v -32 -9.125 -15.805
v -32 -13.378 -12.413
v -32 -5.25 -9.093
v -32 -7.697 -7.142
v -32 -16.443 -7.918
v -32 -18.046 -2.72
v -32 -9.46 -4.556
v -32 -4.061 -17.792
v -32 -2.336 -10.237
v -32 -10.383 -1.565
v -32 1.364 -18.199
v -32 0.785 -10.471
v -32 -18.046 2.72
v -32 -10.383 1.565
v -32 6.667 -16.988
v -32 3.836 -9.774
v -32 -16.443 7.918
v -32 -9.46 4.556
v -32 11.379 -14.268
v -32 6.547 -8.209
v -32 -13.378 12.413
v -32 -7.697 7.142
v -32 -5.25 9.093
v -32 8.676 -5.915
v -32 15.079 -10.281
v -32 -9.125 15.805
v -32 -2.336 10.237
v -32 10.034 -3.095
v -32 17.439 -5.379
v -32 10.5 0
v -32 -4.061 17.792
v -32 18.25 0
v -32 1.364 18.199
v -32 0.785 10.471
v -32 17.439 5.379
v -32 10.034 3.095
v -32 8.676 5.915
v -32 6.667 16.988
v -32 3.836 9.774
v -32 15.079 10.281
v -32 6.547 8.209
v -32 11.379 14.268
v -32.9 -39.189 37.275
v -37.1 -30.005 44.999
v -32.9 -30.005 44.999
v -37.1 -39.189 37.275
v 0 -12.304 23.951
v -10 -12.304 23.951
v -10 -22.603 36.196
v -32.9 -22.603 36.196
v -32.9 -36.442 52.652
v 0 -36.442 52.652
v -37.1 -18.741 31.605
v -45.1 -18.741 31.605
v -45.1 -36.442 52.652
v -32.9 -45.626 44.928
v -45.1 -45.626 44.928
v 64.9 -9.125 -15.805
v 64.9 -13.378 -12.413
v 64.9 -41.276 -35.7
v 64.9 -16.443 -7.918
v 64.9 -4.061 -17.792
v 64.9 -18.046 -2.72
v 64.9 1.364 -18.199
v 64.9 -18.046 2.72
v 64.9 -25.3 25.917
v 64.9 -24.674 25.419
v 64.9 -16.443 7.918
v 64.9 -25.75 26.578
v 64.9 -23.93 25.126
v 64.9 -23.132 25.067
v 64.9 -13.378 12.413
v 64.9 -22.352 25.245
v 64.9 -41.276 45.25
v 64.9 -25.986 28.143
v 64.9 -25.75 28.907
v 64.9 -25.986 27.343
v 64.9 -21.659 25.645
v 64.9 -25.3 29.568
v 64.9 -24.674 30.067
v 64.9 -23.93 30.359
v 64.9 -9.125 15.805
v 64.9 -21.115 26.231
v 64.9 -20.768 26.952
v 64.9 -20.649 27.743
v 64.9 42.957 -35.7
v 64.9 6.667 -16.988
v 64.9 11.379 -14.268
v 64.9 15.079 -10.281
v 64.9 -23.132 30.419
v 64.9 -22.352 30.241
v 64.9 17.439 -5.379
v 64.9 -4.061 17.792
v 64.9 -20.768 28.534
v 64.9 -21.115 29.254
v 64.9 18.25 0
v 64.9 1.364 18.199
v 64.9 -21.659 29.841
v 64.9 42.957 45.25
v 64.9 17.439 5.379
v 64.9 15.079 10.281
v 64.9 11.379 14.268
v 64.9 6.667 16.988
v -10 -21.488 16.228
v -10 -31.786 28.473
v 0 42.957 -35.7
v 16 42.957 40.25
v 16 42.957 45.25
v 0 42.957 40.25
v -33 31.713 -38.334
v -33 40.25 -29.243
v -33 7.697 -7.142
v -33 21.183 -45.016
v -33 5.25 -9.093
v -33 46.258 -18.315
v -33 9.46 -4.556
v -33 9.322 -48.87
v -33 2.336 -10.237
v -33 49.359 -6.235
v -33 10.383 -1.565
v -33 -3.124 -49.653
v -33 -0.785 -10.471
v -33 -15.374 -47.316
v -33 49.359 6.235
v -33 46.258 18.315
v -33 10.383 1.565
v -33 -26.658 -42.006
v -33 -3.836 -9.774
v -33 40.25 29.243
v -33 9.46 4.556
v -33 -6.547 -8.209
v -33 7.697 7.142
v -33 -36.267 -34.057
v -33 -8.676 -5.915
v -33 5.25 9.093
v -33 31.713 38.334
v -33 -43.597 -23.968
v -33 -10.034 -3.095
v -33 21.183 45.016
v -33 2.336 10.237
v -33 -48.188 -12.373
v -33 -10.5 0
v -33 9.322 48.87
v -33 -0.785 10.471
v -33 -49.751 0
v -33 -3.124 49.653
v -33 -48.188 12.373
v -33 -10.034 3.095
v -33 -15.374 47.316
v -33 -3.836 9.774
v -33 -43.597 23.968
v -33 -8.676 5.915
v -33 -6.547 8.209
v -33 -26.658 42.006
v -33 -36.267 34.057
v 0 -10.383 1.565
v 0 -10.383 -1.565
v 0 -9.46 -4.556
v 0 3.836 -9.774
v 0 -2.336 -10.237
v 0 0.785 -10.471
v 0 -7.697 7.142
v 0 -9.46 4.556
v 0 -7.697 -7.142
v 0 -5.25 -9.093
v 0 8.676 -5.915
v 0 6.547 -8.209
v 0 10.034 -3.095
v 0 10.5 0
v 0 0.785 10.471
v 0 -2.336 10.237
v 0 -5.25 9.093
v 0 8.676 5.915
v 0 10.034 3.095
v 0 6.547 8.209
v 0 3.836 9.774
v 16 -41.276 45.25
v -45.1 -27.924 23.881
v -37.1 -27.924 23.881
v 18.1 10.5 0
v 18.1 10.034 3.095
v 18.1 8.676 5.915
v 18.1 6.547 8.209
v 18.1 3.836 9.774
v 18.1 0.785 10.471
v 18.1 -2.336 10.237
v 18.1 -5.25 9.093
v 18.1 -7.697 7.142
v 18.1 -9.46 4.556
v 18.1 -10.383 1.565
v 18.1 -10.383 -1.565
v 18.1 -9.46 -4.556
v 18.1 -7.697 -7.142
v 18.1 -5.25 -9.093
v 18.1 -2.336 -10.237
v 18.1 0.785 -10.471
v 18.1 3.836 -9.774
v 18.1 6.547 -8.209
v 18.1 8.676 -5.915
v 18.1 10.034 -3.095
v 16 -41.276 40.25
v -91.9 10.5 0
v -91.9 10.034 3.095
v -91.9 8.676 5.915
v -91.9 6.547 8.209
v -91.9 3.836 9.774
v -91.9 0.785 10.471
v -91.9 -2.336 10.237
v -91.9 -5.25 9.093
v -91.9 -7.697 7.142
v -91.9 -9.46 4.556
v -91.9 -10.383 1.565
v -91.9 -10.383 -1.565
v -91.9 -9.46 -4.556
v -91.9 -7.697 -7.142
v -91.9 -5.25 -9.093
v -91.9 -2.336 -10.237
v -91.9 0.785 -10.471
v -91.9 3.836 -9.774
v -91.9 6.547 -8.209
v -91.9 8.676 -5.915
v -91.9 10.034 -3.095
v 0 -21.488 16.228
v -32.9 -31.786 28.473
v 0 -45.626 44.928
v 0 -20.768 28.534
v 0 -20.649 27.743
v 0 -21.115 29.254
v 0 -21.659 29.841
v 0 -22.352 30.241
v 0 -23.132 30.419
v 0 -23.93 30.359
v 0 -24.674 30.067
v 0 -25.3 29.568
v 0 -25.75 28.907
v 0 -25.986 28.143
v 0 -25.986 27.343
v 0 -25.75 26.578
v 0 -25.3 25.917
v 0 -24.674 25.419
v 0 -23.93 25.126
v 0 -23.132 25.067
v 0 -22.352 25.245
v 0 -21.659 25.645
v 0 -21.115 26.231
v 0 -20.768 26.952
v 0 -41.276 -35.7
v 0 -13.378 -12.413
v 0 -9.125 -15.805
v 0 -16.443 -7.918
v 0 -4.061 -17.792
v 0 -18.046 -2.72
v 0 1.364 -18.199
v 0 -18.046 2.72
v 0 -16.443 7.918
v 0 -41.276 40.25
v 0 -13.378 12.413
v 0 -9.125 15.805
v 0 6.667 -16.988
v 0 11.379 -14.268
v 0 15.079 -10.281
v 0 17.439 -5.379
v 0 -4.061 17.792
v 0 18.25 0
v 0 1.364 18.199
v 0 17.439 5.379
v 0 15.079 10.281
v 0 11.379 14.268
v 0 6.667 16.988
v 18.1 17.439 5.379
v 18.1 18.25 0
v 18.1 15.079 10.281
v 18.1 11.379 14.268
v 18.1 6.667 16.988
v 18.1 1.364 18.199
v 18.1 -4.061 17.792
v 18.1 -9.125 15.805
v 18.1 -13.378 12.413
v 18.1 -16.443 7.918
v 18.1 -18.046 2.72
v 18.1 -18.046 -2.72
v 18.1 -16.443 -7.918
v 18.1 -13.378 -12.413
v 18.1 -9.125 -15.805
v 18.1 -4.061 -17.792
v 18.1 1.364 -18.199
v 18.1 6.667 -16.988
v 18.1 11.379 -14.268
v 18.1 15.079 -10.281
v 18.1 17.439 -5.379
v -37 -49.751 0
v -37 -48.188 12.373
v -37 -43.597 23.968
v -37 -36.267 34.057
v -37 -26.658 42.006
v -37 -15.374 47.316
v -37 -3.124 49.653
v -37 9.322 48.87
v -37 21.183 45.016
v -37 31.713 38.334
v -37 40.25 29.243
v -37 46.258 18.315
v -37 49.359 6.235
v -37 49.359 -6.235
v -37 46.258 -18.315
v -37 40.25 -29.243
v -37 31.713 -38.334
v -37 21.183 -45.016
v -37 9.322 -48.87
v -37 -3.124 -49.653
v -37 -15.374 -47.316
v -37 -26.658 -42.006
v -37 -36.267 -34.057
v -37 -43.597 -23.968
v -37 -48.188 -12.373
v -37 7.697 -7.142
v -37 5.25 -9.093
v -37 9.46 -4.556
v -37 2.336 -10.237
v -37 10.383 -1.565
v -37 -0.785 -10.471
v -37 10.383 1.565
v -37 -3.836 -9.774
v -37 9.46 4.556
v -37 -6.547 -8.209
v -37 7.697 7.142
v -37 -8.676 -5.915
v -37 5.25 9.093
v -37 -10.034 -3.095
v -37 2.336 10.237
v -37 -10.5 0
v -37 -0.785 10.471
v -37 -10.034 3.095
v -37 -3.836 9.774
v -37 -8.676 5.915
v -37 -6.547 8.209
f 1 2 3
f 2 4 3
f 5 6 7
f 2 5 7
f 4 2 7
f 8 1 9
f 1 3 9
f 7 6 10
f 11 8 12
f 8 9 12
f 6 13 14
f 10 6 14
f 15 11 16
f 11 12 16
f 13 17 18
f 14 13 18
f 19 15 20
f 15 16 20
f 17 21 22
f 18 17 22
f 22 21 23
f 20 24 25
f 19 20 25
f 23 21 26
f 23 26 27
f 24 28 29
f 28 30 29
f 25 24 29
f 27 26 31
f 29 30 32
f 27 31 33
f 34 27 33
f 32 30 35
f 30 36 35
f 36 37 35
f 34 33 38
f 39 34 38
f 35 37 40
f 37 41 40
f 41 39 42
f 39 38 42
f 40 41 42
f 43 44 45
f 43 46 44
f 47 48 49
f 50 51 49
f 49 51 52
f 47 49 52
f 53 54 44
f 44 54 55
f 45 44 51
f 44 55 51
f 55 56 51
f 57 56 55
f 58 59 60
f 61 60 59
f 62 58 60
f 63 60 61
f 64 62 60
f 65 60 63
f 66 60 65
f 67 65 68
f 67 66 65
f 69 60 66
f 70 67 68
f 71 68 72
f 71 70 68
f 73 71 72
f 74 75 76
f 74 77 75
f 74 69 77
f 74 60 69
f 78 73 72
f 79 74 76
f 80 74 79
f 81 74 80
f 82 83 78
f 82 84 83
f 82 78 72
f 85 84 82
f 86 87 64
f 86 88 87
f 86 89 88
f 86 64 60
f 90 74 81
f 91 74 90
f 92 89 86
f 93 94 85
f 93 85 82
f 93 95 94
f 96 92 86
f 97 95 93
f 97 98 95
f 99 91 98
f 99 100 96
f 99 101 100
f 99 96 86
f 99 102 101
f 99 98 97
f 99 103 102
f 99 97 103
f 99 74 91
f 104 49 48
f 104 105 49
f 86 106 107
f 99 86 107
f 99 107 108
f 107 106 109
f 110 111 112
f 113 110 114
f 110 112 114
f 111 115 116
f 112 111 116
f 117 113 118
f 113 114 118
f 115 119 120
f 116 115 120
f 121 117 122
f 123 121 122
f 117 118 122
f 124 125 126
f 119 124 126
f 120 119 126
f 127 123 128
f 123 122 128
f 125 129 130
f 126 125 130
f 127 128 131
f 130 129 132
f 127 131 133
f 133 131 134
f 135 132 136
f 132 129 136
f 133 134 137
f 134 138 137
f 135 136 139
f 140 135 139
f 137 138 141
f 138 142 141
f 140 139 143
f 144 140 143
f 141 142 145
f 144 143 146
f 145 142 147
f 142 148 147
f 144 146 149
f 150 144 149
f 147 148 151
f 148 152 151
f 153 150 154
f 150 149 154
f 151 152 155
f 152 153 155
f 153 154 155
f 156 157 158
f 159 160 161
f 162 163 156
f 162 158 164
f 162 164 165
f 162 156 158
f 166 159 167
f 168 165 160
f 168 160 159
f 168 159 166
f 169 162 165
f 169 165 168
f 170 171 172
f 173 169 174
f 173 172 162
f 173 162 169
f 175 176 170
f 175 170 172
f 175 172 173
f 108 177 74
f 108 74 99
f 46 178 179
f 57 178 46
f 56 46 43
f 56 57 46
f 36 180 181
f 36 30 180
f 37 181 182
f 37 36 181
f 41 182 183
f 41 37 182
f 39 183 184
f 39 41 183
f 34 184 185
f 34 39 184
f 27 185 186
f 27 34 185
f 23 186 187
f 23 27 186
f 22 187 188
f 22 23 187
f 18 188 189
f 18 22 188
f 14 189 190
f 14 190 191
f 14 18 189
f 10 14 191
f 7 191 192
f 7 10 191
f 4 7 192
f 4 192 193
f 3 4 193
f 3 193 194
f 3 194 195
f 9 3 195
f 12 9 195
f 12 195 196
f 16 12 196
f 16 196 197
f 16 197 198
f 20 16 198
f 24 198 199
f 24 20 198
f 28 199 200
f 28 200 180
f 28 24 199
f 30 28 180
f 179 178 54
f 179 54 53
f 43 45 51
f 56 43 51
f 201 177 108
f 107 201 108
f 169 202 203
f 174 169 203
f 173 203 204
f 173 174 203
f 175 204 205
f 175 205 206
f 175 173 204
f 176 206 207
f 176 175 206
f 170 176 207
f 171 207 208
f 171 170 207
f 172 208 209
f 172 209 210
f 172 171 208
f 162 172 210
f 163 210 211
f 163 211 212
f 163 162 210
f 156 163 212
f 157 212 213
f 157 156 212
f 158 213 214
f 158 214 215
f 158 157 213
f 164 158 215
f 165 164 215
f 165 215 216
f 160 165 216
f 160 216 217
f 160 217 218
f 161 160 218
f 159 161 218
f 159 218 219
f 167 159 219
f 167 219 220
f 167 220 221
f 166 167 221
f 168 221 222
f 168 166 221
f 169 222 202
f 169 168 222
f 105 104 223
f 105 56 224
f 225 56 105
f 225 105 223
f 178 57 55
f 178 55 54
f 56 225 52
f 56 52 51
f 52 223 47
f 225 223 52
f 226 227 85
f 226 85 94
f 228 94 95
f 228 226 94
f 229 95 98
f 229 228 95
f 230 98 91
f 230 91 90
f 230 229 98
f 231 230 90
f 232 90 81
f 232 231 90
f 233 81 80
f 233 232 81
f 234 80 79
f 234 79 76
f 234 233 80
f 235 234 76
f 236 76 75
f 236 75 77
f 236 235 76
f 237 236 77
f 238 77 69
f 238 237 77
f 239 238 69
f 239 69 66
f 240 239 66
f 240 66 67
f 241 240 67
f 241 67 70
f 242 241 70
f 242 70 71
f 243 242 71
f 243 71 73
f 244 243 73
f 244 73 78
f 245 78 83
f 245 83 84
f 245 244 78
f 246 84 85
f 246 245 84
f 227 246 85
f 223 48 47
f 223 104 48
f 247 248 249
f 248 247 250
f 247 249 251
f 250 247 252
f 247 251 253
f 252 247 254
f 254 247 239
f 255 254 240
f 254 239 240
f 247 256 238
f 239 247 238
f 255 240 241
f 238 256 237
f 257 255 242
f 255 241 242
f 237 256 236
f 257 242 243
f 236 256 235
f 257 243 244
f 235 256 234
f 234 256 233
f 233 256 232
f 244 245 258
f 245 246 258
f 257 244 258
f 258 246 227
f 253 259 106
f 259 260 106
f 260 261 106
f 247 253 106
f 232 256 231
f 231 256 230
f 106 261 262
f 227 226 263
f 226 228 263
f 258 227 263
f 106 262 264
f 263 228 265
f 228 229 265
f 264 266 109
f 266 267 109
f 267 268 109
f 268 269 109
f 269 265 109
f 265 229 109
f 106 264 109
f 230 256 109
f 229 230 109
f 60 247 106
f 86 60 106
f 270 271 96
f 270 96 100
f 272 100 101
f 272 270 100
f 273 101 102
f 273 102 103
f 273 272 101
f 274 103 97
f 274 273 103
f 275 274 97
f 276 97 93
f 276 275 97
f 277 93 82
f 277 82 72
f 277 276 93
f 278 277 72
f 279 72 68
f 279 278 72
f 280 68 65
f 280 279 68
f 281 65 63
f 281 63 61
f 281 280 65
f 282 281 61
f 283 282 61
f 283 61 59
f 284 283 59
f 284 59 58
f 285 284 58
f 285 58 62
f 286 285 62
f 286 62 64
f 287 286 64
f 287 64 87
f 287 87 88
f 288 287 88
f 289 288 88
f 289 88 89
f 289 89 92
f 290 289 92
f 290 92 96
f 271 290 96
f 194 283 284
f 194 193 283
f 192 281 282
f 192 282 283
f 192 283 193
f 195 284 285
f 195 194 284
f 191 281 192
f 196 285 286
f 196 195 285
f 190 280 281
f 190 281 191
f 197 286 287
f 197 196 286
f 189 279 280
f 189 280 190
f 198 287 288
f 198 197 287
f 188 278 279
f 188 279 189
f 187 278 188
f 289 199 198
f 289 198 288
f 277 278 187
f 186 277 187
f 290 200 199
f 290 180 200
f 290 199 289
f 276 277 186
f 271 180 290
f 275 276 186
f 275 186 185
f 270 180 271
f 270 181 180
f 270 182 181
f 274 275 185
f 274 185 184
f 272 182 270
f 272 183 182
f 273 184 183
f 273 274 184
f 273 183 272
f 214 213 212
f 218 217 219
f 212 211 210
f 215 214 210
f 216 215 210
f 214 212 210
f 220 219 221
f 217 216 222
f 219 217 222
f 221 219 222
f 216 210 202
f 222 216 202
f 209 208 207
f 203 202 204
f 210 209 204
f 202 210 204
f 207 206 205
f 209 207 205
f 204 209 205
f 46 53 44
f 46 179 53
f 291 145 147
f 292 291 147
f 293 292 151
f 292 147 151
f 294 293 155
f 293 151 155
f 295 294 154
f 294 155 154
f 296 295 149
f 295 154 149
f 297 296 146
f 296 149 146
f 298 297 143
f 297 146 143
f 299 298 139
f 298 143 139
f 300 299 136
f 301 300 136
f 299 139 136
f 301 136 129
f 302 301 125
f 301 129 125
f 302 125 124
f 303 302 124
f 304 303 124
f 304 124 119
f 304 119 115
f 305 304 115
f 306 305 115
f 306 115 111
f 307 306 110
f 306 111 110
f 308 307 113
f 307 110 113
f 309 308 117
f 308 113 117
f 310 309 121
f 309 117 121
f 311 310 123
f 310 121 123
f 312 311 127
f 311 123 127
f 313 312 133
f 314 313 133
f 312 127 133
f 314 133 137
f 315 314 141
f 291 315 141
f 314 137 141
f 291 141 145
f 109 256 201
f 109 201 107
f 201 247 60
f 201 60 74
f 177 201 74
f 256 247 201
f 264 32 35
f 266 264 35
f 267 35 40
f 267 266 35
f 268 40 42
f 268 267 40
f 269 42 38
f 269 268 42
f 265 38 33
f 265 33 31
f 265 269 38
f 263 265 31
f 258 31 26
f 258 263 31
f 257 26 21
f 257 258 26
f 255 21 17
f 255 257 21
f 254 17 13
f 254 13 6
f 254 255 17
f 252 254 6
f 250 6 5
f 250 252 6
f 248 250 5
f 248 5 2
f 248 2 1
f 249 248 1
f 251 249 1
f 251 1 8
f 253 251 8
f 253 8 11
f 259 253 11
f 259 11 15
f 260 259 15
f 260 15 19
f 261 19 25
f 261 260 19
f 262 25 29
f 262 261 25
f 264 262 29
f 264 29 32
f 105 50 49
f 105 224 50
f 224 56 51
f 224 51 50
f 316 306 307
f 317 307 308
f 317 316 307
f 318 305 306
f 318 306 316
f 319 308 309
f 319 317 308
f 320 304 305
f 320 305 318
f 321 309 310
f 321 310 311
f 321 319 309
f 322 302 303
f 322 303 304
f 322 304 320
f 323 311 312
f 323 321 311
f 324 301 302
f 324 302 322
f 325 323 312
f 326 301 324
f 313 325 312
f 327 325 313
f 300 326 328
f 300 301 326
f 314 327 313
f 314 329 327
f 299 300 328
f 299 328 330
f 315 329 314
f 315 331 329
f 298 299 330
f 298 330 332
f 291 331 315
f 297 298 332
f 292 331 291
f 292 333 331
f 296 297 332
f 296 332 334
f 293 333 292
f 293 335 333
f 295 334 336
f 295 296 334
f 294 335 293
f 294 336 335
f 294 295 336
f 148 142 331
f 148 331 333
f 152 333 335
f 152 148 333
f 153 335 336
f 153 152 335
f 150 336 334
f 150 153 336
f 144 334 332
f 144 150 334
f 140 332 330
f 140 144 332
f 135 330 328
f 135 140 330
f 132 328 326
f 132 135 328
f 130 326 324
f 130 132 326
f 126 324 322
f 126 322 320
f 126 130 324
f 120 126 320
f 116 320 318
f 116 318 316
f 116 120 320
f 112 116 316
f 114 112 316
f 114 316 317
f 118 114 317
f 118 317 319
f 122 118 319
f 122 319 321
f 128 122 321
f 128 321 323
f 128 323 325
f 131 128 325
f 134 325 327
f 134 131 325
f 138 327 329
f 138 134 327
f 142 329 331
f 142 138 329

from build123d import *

# Parameters (mm, degrees)
F0_W          = 84.2324148785
F0_H          = 75.9502873162
F0_R          = 18.25
F0_R_2        = 2.6835567487
F1_DEPTH      = 64.9
F2_START      = 16
F0_H_2        = 5
F2_DEPTH      = 48.9
F0_R_3        = 10.5
F3_DEPTH      = 32
F3_DEPTH_BACK = 18.1
F4_DEPTH      = 91.9
F6_R          = 49.7512294039
F6_R_2        = 10.5
F7_DEPTH      = 4
F10_DEPTH     = 6
F11_DEPTH     = 6


with BuildPart() as f1:
    # F0 (on Right) → F1 (new body)
    with BuildSketch(Plane.YZ):
        with Locations((0.8405496071, 2.2748563419)):
            Rectangle(F0_W, F0_H)
        Circle(F0_R, mode=Mode.SUBTRACT)
        with Locations((-23.3325695414, 27.7426332311)):
            Circle(F0_R_2, mode=Mode.SUBTRACT)
    extrude(amount=F1_DEPTH)

    # F0 (on Right) → F2 (join)
    with BuildSketch(Plane.YZ.offset(F2_START)):
        with Locations((0.8405496071, 42.75)):
            Rectangle(F0_W, F0_H_2)
    extrude(amount=F2_DEPTH)

    # F0 (on Right) → F3 (join, two sides)
    with BuildSketch(Plane.YZ) as f3_sk:
        Circle(F0_R)
        Circle(F0_R_3, mode=Mode.SUBTRACT)
    extrude(amount=-F3_DEPTH)
    extrude(f3_sk.sketch, amount=F3_DEPTH_BACK)


with BuildPart() as f4:
    # F0 (on Right) → F4 (new body)
    with BuildSketch(Plane.YZ):
        Circle(F0_R_3)
    extrude(amount=-F4_DEPTH)


with BuildPart() as f7:
    # F6 (on offset) → F7 (new body)
    with BuildSketch(Plane(origin=(-33, 0, 0), x_dir=(0, -1, 0), z_dir=(-1, 0, 0))):
        Circle(F6_R)
        Circle(F6_R_2, mode=Mode.SUBTRACT)
    extrude(amount=F7_DEPTH)


with BuildPart() as f10:
    # F9 (on 3pt) → F10 (new body, symmetric)
    with BuildSketch(Plane(origin=(0, 0, 0), x_dir=(1, 0, 0), z_dir=(0, -0.7653140202, -0.6436570908))):
        Polygon((-10, 26.25), (0, 26.25), (0, 63.7512294039), (-32.9, 63.7512294039), (-32.9, 53.7512294039), (-32.9, 42.25), (-10, 42.25), align=None)
    extrude(amount=F10_DEPTH, both=True)


with BuildPart() as f11:
    # F9 (on 3pt) → F11 (new body, symmetric)
    with BuildSketch(Plane(origin=(0, 0, 0), x_dir=(1, 0, 0), z_dir=(0, -0.7653140202, -0.6436570908))):
        Polygon((-32.9, 53.7512294039), (-32.9, 63.7512294039), (-45.1, 63.7512294039), (-45.1, 36.25), (-37.1, 36.25), (-37.1, 53.7512294039), align=None)
    extrude(amount=F11_DEPTH, both=True)


solid = Compound([f1.part, f4.part, f7.part, f10.part, f11.part])
